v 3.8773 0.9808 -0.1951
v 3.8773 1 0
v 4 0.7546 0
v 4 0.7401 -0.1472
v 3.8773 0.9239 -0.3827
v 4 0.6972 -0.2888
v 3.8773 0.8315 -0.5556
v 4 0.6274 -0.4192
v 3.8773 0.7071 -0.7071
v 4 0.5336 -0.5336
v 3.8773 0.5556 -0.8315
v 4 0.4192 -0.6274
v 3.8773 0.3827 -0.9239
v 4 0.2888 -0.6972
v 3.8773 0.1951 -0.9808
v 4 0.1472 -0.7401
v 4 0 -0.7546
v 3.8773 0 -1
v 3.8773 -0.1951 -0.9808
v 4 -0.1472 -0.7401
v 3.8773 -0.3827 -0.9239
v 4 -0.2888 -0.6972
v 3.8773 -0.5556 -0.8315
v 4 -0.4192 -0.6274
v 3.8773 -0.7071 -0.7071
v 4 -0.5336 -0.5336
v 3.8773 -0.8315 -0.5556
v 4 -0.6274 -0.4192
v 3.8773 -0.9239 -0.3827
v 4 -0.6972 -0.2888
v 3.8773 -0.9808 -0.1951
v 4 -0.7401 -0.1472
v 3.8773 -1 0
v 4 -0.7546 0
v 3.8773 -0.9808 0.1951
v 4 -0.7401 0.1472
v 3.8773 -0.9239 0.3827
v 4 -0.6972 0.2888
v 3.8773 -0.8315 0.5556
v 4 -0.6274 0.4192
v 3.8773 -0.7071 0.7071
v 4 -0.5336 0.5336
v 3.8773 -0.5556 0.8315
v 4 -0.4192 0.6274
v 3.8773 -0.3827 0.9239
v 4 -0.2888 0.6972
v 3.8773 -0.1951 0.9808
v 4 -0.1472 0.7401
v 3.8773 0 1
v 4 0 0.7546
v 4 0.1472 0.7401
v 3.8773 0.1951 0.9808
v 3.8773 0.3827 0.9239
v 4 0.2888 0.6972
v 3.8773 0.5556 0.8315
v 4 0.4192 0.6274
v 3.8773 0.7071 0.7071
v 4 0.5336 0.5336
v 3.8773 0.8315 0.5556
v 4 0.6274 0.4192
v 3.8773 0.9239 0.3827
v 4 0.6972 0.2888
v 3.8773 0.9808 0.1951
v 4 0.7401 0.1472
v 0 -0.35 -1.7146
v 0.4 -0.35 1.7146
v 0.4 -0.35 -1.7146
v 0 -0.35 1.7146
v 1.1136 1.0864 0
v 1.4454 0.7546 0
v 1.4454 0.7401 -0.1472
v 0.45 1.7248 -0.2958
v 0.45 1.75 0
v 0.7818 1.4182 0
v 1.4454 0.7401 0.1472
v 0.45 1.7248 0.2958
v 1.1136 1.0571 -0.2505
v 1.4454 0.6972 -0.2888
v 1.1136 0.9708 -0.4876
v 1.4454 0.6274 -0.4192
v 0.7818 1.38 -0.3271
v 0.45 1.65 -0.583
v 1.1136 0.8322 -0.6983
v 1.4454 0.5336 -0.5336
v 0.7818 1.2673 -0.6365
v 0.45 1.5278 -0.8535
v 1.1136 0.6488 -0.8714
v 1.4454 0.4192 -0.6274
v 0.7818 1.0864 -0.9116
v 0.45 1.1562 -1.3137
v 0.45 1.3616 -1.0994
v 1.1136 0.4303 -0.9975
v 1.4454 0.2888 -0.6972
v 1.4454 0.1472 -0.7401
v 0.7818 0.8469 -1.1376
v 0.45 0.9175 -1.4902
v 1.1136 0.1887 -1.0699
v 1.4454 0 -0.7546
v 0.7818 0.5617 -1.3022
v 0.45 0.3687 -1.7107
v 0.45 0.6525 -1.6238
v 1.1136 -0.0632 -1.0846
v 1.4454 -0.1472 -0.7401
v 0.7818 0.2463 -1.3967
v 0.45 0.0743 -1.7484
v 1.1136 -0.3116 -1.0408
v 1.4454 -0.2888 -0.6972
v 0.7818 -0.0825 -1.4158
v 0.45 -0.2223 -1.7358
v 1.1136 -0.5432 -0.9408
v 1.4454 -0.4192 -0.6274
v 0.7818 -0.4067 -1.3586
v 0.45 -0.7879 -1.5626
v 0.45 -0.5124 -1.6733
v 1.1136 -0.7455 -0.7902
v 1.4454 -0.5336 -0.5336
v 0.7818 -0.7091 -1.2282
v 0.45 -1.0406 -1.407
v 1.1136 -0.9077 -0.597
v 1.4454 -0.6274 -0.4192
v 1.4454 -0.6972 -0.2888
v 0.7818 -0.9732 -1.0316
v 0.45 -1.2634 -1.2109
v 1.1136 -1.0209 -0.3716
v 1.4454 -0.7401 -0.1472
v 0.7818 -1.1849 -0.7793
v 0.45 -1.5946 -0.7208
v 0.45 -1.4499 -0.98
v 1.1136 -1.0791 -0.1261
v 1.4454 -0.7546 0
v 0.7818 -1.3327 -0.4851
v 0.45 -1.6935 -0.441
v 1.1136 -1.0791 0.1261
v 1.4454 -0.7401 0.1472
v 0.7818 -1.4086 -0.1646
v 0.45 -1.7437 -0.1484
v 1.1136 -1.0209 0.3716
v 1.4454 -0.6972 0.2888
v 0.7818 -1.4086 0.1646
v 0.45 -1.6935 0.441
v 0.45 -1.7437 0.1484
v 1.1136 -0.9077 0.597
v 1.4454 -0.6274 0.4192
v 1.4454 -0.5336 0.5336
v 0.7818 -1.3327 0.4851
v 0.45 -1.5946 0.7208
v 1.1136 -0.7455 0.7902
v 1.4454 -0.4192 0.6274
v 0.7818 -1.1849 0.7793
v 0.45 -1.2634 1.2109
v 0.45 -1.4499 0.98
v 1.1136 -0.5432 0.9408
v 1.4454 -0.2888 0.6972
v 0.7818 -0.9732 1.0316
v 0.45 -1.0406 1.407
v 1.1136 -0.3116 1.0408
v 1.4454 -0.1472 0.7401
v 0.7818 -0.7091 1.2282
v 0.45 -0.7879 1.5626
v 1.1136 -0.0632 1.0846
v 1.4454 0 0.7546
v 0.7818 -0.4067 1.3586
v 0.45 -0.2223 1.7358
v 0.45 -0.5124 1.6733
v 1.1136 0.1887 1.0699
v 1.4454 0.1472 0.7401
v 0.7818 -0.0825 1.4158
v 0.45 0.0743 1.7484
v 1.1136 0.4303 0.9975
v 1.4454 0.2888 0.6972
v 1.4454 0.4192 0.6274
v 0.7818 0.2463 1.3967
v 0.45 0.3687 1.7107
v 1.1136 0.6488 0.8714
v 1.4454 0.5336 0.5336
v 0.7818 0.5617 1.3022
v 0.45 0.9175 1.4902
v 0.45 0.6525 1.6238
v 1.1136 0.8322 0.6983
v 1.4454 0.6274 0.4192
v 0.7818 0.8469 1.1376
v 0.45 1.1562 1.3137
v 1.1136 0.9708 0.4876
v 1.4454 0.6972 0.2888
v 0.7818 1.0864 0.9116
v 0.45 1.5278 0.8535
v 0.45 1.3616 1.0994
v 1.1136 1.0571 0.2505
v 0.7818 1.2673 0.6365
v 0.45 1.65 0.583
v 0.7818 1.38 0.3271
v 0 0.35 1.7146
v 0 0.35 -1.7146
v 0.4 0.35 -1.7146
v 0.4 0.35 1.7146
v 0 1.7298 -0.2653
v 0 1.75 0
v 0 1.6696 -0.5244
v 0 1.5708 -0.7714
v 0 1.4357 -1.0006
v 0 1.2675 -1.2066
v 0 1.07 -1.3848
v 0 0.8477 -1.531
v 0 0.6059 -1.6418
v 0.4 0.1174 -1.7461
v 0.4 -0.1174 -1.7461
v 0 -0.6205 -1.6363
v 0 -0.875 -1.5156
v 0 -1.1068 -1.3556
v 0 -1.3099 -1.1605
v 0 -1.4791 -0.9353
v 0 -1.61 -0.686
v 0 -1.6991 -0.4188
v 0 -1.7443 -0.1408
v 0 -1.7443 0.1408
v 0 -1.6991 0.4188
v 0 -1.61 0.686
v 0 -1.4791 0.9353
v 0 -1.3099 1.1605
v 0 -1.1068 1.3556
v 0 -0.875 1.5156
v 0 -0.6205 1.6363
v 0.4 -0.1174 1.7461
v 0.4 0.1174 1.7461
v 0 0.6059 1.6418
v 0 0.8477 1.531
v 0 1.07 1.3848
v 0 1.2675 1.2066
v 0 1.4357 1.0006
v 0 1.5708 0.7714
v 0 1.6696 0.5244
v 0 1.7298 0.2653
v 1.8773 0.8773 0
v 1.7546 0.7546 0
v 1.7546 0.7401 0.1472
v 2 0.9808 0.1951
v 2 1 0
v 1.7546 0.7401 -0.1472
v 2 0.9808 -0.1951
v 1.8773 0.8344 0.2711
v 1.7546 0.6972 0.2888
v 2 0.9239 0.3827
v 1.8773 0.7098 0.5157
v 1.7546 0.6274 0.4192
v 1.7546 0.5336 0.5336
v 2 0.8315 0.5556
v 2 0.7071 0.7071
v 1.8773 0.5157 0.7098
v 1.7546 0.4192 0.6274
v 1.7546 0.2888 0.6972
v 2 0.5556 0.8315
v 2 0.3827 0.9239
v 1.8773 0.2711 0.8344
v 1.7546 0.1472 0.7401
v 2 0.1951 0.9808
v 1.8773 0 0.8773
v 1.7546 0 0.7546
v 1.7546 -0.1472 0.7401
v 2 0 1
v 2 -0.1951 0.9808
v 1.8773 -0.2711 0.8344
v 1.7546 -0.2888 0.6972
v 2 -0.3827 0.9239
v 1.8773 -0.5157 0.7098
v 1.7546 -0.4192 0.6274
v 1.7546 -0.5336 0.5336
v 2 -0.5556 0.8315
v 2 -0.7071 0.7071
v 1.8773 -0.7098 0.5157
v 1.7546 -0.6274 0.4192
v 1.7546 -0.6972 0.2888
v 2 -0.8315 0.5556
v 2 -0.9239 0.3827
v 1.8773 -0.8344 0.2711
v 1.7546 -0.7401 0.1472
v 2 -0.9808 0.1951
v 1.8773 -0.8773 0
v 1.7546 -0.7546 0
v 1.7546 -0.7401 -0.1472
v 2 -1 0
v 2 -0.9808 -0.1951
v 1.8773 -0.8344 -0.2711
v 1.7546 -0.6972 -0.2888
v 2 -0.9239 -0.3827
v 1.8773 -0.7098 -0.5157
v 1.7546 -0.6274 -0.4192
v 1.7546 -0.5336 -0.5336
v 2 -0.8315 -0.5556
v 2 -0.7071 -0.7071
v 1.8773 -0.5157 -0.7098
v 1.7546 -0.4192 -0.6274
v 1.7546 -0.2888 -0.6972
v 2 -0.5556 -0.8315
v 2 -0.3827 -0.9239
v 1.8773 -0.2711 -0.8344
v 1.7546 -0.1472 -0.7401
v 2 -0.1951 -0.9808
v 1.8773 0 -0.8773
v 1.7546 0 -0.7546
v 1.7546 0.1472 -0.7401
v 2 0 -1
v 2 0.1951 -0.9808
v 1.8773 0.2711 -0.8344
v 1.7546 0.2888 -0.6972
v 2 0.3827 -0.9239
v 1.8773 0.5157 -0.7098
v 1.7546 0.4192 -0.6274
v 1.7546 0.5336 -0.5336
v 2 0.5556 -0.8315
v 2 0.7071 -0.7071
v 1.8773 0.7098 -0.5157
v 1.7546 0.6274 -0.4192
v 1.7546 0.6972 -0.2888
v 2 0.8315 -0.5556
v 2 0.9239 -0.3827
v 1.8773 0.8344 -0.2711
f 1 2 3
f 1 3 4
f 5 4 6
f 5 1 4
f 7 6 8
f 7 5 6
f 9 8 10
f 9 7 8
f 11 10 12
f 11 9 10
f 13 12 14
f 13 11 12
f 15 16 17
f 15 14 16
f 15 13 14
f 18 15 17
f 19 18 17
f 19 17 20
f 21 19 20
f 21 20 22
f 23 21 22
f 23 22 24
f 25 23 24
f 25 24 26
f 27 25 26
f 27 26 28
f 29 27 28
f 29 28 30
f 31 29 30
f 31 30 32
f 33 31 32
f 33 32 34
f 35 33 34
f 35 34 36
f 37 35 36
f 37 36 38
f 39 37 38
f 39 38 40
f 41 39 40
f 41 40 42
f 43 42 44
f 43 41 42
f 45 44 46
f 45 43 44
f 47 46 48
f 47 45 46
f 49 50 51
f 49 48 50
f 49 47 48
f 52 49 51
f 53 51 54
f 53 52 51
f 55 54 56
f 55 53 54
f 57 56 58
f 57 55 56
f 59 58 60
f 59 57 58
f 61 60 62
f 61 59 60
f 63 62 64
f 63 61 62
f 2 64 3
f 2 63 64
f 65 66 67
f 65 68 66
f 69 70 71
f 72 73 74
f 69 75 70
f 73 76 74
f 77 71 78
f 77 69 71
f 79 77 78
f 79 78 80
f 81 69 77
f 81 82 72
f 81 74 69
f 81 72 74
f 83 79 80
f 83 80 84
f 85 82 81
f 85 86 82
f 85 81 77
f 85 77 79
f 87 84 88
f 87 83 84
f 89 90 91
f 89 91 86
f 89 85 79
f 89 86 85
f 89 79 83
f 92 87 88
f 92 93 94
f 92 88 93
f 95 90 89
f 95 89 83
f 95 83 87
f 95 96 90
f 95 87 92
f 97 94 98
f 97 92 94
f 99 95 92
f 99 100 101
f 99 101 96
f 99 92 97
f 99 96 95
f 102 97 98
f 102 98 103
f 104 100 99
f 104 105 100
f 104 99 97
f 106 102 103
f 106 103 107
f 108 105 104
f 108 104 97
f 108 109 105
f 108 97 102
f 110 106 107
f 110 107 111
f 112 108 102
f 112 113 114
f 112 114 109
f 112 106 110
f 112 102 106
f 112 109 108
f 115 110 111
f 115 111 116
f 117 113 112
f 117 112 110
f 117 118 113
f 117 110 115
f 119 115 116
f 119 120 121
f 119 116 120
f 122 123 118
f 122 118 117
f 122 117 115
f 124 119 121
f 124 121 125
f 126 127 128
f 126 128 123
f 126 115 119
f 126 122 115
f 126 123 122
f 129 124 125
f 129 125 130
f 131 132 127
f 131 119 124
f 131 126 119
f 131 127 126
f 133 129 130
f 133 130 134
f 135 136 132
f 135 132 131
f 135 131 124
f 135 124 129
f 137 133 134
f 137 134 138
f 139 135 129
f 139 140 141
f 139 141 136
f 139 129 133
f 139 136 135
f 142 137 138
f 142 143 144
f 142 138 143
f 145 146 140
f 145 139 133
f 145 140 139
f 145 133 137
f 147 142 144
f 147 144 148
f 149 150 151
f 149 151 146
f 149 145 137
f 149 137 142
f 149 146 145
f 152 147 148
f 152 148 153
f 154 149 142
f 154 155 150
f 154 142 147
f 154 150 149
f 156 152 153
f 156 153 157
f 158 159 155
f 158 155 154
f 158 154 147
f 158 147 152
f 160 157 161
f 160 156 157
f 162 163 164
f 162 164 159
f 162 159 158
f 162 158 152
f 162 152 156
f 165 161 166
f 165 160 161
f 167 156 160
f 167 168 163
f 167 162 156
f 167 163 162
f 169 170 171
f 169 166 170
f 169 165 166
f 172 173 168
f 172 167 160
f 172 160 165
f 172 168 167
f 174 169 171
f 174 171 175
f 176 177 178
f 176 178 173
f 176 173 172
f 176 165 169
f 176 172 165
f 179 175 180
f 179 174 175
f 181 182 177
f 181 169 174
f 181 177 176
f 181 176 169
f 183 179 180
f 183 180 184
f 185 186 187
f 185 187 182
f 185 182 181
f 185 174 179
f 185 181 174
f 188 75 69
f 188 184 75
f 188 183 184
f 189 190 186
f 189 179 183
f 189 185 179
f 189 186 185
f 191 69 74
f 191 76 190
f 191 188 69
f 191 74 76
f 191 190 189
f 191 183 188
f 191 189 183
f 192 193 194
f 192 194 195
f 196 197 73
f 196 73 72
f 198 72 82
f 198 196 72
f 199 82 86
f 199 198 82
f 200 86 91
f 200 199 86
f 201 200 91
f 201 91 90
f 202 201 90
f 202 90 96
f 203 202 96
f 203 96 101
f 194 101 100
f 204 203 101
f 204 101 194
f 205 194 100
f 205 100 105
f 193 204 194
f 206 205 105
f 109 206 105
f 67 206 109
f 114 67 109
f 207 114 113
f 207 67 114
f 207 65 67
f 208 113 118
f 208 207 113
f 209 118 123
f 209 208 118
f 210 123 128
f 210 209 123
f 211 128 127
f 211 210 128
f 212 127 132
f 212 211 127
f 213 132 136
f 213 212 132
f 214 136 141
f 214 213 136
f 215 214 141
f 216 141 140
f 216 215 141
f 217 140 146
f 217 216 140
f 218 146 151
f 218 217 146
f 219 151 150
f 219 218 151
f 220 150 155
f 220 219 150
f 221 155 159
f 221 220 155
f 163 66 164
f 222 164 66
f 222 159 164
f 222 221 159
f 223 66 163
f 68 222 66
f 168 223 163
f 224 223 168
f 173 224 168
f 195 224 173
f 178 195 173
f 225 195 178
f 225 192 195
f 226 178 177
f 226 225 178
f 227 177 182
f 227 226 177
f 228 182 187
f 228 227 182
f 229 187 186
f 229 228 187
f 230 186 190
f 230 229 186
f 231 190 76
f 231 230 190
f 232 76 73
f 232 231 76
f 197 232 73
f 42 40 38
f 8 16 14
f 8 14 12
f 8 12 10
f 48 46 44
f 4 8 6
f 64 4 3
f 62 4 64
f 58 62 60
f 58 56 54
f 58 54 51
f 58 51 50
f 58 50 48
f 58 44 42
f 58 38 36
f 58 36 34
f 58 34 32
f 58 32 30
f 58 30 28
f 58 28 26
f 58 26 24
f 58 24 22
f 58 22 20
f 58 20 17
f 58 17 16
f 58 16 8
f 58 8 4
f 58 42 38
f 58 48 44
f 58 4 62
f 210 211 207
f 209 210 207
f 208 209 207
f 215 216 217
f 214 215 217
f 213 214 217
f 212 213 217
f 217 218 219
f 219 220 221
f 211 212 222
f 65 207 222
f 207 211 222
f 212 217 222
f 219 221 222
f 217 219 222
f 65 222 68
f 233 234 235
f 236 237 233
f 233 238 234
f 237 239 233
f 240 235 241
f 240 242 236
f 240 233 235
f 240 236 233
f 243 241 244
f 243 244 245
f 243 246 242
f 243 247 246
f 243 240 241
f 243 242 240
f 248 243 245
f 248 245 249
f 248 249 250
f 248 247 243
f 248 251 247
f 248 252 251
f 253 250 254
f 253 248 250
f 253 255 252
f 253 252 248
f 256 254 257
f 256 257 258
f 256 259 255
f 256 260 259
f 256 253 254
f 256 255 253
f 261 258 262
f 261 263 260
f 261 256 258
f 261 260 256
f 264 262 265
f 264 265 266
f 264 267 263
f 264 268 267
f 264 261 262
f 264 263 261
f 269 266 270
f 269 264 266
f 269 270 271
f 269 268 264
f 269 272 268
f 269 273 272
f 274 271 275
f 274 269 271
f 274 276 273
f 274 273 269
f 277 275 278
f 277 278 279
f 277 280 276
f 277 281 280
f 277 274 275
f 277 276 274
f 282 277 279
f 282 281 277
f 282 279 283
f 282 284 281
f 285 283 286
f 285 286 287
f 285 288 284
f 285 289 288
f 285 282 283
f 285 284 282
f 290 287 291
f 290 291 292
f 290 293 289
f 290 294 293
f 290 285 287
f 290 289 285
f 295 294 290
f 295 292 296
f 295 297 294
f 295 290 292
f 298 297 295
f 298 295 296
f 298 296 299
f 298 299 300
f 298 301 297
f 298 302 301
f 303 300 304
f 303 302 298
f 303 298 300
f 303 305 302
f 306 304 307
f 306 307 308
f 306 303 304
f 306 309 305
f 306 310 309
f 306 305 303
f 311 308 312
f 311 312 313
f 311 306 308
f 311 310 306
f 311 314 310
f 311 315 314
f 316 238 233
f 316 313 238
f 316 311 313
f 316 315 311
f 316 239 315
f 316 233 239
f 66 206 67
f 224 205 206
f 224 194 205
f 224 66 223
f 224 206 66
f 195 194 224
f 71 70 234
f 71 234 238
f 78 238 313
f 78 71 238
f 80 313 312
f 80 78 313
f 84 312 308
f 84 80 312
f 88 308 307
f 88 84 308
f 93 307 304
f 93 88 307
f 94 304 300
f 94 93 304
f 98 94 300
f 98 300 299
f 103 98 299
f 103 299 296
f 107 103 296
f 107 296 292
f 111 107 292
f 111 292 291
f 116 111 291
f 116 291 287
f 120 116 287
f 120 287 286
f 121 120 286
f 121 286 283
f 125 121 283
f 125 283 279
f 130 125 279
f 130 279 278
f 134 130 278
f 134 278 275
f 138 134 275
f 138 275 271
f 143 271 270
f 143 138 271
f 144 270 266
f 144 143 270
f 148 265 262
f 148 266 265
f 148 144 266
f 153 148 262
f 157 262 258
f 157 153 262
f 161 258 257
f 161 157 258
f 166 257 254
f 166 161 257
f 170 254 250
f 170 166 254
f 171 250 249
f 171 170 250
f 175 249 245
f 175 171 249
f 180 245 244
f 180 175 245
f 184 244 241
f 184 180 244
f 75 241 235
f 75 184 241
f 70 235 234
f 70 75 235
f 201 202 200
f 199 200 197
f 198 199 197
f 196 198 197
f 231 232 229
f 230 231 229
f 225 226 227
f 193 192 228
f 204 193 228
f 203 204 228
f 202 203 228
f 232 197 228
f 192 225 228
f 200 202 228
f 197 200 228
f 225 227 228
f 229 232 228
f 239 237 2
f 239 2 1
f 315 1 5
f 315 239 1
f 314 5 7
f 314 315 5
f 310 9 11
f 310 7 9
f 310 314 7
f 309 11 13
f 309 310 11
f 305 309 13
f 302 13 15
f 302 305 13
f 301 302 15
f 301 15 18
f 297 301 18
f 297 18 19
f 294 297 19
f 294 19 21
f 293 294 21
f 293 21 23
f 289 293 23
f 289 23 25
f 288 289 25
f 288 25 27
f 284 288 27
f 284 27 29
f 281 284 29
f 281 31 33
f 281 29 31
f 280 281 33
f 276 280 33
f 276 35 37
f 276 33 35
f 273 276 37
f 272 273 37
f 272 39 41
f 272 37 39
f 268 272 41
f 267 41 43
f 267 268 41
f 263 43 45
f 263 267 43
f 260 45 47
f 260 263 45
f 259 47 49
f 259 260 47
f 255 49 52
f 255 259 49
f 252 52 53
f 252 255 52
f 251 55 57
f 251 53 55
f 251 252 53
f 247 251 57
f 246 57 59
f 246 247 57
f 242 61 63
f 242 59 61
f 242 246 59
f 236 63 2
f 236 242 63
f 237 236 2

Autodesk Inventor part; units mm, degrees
ref_plane "YZ Plane" through (0, 0, 0) normal (1, 0, 0) x (0, 1, 0)
ref_plane "XZ Plane" through (0, 0, 0) normal (0, 1, 0) x (-1, 0, 0)
sketch "Skizze1" plane through (0, 0, 0) normal (0, 0, 1) x (1, 0, 0)
  line L0 (0, 0) -> (4, 0)
  line L1 (4, 0) -> (4, 1)
  line L2 (4, 1) -> (2, 1)
  line L3 (2, 1) -> (1.7546, 0.7546)
  line L4 (1.7546, 0.7546) -> (1.4454, 0.7546)
  line L5 (1.4454, 0.7546) -> (0.45, 1.75)
  line L6 (0.45, 1.75) -> (0, 1.75)
  line L7 (0, 1.75) -> (0, 0)
  line L8 (2, 1) -> (1.2, 1) construction
  line L9 (-0.8, 0) -> (4.8, 0) projected
  line L10 (0, 2.1) -> (0, -0.35) projected
  dimension "d0" = 4
  dimension "d1" = 45
  dimension "d2" = 0.2454
  dimension "d3" = 2
  dimension "d4" = 1.2
  dimension "d5" = 1.5092
  dimension "d6" = 2
  dimension "d7" = 3.5
revolve "Körper" add sketch "Skizze1" angle 360 about axis through (0, 0, 0) along (1, 0, 0)
sketch "Skizze2" plane through (0, 0, 0) normal (-1, 0, 0) x (0, 0, 1)
  line L0 (1.75, -0.35) -> (-1.75, -0.35)
  line L1 (-1.75, -0.35) -> (-1.75, 0.35)
  line L2 (-1.75, 0.35) -> (1.75, 0.35)
  line L3 (1.75, 0.35) -> (1.75, -0.35)
  line L4 (0, 0.35) -> (0, -0.35) construction
  line L5 (-1.75, 0) -> (1.75, 0) construction
  line L6 (0, 1.75) -> (0, 0) projected
  dimension "d15" = 0.7
  dimension "d16" = 3.5
extrude "Loch" cut sketch "Skizze2" against normal blind 0.4
thread "Gewinde" size "M2x0.4" class "6g" standard "ISO Metric profile" length 2
chamfer "Fase1" distance 0.2454 distance2 0.1227 1 edges at (4, -1, 0) measured on face at (4, 0.3275, -0.4215)
ref_plane "Work Plane1" through (33.575, 0, 0) normal (0, 0, -1) x (1, 0, 0)
equation "\"d0\" = NLG"
equation "\"d1\" = 0.5 * SEWI"
equation "\"d2\" = GAL"
equation "\"d3\" = GEL"
equation "\"d4\" = KOH"
equation "\"d5\" = BDM"
equation "\"d6\" = GD"
equation "\"d7\" = KOD"
equation "\"d15\" = SBR"
equation "\"d16\" = KOD"
equation "\"d8\" = STI"
equation "\"d10\" = GEL"
equation "\"d12\" = -0.5 * SPD + 0.5 * GD"
equation "\"d13\" = 0.5 * GAL"
equation "\"NLG\" = 4"
equation "\"GAL\" = 0.61345 * PTC"
equation "\"GEL\" = 2"
equation "\"KOH\" = 1.2"
equation "\"KOD\" = 3.5"
equation "\"SEWI\" = 90deg"
equation "\"BDM\" = NND - 1.2269 * PTC"
equation "\"GD\" = NND"
equation "\"SBR\" = 0.7"
equation "\"STI\" = 0.4"
equation "\"SPD\" = NND - 1.2269 * PTC"
equation "\"GUL\" = 0.61345 * PTC"
equation "\"PTC\" = 0.4"
equation "\"EPV\" = 2.2"
equation "\"THREADDIA\" = 2"
equation "\"TOA\" = 30deg"
equation "\"RR\" = 0.2"
equation "\"NND\" = 2"
equation "\"GD1\" = THREADDIA - 1.2269 * PTC"
properties part number "AS 1427 - M2 x 4" material "Stahl, weich"
